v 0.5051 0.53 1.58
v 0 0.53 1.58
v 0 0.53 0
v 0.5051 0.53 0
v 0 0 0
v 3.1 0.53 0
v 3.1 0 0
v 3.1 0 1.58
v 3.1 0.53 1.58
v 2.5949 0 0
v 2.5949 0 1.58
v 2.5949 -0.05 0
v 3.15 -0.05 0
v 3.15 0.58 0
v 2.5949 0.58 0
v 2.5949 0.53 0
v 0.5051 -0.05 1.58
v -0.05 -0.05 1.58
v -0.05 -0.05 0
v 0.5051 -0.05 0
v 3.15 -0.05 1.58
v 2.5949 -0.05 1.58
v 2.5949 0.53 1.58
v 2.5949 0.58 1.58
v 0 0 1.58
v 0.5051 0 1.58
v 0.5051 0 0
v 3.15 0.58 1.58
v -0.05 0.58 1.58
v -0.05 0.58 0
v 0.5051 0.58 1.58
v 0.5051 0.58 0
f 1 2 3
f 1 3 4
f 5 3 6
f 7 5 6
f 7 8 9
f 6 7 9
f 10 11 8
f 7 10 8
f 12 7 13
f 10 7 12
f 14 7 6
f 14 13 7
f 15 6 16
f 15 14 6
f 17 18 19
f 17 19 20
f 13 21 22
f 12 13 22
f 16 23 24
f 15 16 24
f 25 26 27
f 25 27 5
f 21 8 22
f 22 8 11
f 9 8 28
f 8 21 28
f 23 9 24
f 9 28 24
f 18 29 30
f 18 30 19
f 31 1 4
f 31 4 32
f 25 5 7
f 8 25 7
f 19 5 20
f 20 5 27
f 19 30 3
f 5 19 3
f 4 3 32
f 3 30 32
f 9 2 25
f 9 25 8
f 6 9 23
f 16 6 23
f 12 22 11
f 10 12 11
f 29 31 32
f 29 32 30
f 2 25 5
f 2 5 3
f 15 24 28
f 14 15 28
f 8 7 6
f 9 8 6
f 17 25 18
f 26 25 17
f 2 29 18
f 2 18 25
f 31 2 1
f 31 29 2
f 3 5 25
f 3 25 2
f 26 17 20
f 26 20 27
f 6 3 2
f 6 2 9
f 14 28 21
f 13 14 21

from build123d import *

# Parameters (mm, degrees)
SKETCH1_W             = 3.1
SKETCH1_H             = 0.53
BOSS_EXTRUDE1_DEPTH   = 1.58
BOSS_EXTRUDE2_DEPTH   = 1.58
BOSS_EXTRUDE2_2_DEPTH = 1.58


with BuildPart() as part:
    # Sketch1 → Boss-Extrude1 (new body)
    with BuildSketch(Plane.XY):
        with Locations((1.55, 0.265)):
            Rectangle(SKETCH1_W, SKETCH1_H)
    extrude(amount=BOSS_EXTRUDE1_DEPTH)


with BuildPart() as body_2:
    # Sketch2 → Boss-Extrude2 (new body)
    with BuildSketch(Plane.XY.offset(1.58)):
        Polygon((2.594858091, 0.53), (2.594858091, 0.58), (3.15, 0.58), (3.15, -0.05), (2.594858091, -0.05), (2.594858091, 0), (3.1, 0), (3.1, 0.53), align=None)
    extrude(amount=-BOSS_EXTRUDE2_DEPTH)


with BuildPart() as body_3:
    # Sketch2 → Boss-Extrude2 2 (new body)
    with BuildSketch(Plane.XY.offset(1.58)):
        Polygon((0, 0), (0, 0.53), (0.505141909, 0.53), (0.505141909, 0.58), (-0.05, 0.58), (-0.05, -0.05), (0.505141909, -0.05), (0.505141909, 0), align=None)
    extrude(amount=-BOSS_EXTRUDE2_2_DEPTH)


solid = Compound([part.part, body_2.part, body_3.part])
